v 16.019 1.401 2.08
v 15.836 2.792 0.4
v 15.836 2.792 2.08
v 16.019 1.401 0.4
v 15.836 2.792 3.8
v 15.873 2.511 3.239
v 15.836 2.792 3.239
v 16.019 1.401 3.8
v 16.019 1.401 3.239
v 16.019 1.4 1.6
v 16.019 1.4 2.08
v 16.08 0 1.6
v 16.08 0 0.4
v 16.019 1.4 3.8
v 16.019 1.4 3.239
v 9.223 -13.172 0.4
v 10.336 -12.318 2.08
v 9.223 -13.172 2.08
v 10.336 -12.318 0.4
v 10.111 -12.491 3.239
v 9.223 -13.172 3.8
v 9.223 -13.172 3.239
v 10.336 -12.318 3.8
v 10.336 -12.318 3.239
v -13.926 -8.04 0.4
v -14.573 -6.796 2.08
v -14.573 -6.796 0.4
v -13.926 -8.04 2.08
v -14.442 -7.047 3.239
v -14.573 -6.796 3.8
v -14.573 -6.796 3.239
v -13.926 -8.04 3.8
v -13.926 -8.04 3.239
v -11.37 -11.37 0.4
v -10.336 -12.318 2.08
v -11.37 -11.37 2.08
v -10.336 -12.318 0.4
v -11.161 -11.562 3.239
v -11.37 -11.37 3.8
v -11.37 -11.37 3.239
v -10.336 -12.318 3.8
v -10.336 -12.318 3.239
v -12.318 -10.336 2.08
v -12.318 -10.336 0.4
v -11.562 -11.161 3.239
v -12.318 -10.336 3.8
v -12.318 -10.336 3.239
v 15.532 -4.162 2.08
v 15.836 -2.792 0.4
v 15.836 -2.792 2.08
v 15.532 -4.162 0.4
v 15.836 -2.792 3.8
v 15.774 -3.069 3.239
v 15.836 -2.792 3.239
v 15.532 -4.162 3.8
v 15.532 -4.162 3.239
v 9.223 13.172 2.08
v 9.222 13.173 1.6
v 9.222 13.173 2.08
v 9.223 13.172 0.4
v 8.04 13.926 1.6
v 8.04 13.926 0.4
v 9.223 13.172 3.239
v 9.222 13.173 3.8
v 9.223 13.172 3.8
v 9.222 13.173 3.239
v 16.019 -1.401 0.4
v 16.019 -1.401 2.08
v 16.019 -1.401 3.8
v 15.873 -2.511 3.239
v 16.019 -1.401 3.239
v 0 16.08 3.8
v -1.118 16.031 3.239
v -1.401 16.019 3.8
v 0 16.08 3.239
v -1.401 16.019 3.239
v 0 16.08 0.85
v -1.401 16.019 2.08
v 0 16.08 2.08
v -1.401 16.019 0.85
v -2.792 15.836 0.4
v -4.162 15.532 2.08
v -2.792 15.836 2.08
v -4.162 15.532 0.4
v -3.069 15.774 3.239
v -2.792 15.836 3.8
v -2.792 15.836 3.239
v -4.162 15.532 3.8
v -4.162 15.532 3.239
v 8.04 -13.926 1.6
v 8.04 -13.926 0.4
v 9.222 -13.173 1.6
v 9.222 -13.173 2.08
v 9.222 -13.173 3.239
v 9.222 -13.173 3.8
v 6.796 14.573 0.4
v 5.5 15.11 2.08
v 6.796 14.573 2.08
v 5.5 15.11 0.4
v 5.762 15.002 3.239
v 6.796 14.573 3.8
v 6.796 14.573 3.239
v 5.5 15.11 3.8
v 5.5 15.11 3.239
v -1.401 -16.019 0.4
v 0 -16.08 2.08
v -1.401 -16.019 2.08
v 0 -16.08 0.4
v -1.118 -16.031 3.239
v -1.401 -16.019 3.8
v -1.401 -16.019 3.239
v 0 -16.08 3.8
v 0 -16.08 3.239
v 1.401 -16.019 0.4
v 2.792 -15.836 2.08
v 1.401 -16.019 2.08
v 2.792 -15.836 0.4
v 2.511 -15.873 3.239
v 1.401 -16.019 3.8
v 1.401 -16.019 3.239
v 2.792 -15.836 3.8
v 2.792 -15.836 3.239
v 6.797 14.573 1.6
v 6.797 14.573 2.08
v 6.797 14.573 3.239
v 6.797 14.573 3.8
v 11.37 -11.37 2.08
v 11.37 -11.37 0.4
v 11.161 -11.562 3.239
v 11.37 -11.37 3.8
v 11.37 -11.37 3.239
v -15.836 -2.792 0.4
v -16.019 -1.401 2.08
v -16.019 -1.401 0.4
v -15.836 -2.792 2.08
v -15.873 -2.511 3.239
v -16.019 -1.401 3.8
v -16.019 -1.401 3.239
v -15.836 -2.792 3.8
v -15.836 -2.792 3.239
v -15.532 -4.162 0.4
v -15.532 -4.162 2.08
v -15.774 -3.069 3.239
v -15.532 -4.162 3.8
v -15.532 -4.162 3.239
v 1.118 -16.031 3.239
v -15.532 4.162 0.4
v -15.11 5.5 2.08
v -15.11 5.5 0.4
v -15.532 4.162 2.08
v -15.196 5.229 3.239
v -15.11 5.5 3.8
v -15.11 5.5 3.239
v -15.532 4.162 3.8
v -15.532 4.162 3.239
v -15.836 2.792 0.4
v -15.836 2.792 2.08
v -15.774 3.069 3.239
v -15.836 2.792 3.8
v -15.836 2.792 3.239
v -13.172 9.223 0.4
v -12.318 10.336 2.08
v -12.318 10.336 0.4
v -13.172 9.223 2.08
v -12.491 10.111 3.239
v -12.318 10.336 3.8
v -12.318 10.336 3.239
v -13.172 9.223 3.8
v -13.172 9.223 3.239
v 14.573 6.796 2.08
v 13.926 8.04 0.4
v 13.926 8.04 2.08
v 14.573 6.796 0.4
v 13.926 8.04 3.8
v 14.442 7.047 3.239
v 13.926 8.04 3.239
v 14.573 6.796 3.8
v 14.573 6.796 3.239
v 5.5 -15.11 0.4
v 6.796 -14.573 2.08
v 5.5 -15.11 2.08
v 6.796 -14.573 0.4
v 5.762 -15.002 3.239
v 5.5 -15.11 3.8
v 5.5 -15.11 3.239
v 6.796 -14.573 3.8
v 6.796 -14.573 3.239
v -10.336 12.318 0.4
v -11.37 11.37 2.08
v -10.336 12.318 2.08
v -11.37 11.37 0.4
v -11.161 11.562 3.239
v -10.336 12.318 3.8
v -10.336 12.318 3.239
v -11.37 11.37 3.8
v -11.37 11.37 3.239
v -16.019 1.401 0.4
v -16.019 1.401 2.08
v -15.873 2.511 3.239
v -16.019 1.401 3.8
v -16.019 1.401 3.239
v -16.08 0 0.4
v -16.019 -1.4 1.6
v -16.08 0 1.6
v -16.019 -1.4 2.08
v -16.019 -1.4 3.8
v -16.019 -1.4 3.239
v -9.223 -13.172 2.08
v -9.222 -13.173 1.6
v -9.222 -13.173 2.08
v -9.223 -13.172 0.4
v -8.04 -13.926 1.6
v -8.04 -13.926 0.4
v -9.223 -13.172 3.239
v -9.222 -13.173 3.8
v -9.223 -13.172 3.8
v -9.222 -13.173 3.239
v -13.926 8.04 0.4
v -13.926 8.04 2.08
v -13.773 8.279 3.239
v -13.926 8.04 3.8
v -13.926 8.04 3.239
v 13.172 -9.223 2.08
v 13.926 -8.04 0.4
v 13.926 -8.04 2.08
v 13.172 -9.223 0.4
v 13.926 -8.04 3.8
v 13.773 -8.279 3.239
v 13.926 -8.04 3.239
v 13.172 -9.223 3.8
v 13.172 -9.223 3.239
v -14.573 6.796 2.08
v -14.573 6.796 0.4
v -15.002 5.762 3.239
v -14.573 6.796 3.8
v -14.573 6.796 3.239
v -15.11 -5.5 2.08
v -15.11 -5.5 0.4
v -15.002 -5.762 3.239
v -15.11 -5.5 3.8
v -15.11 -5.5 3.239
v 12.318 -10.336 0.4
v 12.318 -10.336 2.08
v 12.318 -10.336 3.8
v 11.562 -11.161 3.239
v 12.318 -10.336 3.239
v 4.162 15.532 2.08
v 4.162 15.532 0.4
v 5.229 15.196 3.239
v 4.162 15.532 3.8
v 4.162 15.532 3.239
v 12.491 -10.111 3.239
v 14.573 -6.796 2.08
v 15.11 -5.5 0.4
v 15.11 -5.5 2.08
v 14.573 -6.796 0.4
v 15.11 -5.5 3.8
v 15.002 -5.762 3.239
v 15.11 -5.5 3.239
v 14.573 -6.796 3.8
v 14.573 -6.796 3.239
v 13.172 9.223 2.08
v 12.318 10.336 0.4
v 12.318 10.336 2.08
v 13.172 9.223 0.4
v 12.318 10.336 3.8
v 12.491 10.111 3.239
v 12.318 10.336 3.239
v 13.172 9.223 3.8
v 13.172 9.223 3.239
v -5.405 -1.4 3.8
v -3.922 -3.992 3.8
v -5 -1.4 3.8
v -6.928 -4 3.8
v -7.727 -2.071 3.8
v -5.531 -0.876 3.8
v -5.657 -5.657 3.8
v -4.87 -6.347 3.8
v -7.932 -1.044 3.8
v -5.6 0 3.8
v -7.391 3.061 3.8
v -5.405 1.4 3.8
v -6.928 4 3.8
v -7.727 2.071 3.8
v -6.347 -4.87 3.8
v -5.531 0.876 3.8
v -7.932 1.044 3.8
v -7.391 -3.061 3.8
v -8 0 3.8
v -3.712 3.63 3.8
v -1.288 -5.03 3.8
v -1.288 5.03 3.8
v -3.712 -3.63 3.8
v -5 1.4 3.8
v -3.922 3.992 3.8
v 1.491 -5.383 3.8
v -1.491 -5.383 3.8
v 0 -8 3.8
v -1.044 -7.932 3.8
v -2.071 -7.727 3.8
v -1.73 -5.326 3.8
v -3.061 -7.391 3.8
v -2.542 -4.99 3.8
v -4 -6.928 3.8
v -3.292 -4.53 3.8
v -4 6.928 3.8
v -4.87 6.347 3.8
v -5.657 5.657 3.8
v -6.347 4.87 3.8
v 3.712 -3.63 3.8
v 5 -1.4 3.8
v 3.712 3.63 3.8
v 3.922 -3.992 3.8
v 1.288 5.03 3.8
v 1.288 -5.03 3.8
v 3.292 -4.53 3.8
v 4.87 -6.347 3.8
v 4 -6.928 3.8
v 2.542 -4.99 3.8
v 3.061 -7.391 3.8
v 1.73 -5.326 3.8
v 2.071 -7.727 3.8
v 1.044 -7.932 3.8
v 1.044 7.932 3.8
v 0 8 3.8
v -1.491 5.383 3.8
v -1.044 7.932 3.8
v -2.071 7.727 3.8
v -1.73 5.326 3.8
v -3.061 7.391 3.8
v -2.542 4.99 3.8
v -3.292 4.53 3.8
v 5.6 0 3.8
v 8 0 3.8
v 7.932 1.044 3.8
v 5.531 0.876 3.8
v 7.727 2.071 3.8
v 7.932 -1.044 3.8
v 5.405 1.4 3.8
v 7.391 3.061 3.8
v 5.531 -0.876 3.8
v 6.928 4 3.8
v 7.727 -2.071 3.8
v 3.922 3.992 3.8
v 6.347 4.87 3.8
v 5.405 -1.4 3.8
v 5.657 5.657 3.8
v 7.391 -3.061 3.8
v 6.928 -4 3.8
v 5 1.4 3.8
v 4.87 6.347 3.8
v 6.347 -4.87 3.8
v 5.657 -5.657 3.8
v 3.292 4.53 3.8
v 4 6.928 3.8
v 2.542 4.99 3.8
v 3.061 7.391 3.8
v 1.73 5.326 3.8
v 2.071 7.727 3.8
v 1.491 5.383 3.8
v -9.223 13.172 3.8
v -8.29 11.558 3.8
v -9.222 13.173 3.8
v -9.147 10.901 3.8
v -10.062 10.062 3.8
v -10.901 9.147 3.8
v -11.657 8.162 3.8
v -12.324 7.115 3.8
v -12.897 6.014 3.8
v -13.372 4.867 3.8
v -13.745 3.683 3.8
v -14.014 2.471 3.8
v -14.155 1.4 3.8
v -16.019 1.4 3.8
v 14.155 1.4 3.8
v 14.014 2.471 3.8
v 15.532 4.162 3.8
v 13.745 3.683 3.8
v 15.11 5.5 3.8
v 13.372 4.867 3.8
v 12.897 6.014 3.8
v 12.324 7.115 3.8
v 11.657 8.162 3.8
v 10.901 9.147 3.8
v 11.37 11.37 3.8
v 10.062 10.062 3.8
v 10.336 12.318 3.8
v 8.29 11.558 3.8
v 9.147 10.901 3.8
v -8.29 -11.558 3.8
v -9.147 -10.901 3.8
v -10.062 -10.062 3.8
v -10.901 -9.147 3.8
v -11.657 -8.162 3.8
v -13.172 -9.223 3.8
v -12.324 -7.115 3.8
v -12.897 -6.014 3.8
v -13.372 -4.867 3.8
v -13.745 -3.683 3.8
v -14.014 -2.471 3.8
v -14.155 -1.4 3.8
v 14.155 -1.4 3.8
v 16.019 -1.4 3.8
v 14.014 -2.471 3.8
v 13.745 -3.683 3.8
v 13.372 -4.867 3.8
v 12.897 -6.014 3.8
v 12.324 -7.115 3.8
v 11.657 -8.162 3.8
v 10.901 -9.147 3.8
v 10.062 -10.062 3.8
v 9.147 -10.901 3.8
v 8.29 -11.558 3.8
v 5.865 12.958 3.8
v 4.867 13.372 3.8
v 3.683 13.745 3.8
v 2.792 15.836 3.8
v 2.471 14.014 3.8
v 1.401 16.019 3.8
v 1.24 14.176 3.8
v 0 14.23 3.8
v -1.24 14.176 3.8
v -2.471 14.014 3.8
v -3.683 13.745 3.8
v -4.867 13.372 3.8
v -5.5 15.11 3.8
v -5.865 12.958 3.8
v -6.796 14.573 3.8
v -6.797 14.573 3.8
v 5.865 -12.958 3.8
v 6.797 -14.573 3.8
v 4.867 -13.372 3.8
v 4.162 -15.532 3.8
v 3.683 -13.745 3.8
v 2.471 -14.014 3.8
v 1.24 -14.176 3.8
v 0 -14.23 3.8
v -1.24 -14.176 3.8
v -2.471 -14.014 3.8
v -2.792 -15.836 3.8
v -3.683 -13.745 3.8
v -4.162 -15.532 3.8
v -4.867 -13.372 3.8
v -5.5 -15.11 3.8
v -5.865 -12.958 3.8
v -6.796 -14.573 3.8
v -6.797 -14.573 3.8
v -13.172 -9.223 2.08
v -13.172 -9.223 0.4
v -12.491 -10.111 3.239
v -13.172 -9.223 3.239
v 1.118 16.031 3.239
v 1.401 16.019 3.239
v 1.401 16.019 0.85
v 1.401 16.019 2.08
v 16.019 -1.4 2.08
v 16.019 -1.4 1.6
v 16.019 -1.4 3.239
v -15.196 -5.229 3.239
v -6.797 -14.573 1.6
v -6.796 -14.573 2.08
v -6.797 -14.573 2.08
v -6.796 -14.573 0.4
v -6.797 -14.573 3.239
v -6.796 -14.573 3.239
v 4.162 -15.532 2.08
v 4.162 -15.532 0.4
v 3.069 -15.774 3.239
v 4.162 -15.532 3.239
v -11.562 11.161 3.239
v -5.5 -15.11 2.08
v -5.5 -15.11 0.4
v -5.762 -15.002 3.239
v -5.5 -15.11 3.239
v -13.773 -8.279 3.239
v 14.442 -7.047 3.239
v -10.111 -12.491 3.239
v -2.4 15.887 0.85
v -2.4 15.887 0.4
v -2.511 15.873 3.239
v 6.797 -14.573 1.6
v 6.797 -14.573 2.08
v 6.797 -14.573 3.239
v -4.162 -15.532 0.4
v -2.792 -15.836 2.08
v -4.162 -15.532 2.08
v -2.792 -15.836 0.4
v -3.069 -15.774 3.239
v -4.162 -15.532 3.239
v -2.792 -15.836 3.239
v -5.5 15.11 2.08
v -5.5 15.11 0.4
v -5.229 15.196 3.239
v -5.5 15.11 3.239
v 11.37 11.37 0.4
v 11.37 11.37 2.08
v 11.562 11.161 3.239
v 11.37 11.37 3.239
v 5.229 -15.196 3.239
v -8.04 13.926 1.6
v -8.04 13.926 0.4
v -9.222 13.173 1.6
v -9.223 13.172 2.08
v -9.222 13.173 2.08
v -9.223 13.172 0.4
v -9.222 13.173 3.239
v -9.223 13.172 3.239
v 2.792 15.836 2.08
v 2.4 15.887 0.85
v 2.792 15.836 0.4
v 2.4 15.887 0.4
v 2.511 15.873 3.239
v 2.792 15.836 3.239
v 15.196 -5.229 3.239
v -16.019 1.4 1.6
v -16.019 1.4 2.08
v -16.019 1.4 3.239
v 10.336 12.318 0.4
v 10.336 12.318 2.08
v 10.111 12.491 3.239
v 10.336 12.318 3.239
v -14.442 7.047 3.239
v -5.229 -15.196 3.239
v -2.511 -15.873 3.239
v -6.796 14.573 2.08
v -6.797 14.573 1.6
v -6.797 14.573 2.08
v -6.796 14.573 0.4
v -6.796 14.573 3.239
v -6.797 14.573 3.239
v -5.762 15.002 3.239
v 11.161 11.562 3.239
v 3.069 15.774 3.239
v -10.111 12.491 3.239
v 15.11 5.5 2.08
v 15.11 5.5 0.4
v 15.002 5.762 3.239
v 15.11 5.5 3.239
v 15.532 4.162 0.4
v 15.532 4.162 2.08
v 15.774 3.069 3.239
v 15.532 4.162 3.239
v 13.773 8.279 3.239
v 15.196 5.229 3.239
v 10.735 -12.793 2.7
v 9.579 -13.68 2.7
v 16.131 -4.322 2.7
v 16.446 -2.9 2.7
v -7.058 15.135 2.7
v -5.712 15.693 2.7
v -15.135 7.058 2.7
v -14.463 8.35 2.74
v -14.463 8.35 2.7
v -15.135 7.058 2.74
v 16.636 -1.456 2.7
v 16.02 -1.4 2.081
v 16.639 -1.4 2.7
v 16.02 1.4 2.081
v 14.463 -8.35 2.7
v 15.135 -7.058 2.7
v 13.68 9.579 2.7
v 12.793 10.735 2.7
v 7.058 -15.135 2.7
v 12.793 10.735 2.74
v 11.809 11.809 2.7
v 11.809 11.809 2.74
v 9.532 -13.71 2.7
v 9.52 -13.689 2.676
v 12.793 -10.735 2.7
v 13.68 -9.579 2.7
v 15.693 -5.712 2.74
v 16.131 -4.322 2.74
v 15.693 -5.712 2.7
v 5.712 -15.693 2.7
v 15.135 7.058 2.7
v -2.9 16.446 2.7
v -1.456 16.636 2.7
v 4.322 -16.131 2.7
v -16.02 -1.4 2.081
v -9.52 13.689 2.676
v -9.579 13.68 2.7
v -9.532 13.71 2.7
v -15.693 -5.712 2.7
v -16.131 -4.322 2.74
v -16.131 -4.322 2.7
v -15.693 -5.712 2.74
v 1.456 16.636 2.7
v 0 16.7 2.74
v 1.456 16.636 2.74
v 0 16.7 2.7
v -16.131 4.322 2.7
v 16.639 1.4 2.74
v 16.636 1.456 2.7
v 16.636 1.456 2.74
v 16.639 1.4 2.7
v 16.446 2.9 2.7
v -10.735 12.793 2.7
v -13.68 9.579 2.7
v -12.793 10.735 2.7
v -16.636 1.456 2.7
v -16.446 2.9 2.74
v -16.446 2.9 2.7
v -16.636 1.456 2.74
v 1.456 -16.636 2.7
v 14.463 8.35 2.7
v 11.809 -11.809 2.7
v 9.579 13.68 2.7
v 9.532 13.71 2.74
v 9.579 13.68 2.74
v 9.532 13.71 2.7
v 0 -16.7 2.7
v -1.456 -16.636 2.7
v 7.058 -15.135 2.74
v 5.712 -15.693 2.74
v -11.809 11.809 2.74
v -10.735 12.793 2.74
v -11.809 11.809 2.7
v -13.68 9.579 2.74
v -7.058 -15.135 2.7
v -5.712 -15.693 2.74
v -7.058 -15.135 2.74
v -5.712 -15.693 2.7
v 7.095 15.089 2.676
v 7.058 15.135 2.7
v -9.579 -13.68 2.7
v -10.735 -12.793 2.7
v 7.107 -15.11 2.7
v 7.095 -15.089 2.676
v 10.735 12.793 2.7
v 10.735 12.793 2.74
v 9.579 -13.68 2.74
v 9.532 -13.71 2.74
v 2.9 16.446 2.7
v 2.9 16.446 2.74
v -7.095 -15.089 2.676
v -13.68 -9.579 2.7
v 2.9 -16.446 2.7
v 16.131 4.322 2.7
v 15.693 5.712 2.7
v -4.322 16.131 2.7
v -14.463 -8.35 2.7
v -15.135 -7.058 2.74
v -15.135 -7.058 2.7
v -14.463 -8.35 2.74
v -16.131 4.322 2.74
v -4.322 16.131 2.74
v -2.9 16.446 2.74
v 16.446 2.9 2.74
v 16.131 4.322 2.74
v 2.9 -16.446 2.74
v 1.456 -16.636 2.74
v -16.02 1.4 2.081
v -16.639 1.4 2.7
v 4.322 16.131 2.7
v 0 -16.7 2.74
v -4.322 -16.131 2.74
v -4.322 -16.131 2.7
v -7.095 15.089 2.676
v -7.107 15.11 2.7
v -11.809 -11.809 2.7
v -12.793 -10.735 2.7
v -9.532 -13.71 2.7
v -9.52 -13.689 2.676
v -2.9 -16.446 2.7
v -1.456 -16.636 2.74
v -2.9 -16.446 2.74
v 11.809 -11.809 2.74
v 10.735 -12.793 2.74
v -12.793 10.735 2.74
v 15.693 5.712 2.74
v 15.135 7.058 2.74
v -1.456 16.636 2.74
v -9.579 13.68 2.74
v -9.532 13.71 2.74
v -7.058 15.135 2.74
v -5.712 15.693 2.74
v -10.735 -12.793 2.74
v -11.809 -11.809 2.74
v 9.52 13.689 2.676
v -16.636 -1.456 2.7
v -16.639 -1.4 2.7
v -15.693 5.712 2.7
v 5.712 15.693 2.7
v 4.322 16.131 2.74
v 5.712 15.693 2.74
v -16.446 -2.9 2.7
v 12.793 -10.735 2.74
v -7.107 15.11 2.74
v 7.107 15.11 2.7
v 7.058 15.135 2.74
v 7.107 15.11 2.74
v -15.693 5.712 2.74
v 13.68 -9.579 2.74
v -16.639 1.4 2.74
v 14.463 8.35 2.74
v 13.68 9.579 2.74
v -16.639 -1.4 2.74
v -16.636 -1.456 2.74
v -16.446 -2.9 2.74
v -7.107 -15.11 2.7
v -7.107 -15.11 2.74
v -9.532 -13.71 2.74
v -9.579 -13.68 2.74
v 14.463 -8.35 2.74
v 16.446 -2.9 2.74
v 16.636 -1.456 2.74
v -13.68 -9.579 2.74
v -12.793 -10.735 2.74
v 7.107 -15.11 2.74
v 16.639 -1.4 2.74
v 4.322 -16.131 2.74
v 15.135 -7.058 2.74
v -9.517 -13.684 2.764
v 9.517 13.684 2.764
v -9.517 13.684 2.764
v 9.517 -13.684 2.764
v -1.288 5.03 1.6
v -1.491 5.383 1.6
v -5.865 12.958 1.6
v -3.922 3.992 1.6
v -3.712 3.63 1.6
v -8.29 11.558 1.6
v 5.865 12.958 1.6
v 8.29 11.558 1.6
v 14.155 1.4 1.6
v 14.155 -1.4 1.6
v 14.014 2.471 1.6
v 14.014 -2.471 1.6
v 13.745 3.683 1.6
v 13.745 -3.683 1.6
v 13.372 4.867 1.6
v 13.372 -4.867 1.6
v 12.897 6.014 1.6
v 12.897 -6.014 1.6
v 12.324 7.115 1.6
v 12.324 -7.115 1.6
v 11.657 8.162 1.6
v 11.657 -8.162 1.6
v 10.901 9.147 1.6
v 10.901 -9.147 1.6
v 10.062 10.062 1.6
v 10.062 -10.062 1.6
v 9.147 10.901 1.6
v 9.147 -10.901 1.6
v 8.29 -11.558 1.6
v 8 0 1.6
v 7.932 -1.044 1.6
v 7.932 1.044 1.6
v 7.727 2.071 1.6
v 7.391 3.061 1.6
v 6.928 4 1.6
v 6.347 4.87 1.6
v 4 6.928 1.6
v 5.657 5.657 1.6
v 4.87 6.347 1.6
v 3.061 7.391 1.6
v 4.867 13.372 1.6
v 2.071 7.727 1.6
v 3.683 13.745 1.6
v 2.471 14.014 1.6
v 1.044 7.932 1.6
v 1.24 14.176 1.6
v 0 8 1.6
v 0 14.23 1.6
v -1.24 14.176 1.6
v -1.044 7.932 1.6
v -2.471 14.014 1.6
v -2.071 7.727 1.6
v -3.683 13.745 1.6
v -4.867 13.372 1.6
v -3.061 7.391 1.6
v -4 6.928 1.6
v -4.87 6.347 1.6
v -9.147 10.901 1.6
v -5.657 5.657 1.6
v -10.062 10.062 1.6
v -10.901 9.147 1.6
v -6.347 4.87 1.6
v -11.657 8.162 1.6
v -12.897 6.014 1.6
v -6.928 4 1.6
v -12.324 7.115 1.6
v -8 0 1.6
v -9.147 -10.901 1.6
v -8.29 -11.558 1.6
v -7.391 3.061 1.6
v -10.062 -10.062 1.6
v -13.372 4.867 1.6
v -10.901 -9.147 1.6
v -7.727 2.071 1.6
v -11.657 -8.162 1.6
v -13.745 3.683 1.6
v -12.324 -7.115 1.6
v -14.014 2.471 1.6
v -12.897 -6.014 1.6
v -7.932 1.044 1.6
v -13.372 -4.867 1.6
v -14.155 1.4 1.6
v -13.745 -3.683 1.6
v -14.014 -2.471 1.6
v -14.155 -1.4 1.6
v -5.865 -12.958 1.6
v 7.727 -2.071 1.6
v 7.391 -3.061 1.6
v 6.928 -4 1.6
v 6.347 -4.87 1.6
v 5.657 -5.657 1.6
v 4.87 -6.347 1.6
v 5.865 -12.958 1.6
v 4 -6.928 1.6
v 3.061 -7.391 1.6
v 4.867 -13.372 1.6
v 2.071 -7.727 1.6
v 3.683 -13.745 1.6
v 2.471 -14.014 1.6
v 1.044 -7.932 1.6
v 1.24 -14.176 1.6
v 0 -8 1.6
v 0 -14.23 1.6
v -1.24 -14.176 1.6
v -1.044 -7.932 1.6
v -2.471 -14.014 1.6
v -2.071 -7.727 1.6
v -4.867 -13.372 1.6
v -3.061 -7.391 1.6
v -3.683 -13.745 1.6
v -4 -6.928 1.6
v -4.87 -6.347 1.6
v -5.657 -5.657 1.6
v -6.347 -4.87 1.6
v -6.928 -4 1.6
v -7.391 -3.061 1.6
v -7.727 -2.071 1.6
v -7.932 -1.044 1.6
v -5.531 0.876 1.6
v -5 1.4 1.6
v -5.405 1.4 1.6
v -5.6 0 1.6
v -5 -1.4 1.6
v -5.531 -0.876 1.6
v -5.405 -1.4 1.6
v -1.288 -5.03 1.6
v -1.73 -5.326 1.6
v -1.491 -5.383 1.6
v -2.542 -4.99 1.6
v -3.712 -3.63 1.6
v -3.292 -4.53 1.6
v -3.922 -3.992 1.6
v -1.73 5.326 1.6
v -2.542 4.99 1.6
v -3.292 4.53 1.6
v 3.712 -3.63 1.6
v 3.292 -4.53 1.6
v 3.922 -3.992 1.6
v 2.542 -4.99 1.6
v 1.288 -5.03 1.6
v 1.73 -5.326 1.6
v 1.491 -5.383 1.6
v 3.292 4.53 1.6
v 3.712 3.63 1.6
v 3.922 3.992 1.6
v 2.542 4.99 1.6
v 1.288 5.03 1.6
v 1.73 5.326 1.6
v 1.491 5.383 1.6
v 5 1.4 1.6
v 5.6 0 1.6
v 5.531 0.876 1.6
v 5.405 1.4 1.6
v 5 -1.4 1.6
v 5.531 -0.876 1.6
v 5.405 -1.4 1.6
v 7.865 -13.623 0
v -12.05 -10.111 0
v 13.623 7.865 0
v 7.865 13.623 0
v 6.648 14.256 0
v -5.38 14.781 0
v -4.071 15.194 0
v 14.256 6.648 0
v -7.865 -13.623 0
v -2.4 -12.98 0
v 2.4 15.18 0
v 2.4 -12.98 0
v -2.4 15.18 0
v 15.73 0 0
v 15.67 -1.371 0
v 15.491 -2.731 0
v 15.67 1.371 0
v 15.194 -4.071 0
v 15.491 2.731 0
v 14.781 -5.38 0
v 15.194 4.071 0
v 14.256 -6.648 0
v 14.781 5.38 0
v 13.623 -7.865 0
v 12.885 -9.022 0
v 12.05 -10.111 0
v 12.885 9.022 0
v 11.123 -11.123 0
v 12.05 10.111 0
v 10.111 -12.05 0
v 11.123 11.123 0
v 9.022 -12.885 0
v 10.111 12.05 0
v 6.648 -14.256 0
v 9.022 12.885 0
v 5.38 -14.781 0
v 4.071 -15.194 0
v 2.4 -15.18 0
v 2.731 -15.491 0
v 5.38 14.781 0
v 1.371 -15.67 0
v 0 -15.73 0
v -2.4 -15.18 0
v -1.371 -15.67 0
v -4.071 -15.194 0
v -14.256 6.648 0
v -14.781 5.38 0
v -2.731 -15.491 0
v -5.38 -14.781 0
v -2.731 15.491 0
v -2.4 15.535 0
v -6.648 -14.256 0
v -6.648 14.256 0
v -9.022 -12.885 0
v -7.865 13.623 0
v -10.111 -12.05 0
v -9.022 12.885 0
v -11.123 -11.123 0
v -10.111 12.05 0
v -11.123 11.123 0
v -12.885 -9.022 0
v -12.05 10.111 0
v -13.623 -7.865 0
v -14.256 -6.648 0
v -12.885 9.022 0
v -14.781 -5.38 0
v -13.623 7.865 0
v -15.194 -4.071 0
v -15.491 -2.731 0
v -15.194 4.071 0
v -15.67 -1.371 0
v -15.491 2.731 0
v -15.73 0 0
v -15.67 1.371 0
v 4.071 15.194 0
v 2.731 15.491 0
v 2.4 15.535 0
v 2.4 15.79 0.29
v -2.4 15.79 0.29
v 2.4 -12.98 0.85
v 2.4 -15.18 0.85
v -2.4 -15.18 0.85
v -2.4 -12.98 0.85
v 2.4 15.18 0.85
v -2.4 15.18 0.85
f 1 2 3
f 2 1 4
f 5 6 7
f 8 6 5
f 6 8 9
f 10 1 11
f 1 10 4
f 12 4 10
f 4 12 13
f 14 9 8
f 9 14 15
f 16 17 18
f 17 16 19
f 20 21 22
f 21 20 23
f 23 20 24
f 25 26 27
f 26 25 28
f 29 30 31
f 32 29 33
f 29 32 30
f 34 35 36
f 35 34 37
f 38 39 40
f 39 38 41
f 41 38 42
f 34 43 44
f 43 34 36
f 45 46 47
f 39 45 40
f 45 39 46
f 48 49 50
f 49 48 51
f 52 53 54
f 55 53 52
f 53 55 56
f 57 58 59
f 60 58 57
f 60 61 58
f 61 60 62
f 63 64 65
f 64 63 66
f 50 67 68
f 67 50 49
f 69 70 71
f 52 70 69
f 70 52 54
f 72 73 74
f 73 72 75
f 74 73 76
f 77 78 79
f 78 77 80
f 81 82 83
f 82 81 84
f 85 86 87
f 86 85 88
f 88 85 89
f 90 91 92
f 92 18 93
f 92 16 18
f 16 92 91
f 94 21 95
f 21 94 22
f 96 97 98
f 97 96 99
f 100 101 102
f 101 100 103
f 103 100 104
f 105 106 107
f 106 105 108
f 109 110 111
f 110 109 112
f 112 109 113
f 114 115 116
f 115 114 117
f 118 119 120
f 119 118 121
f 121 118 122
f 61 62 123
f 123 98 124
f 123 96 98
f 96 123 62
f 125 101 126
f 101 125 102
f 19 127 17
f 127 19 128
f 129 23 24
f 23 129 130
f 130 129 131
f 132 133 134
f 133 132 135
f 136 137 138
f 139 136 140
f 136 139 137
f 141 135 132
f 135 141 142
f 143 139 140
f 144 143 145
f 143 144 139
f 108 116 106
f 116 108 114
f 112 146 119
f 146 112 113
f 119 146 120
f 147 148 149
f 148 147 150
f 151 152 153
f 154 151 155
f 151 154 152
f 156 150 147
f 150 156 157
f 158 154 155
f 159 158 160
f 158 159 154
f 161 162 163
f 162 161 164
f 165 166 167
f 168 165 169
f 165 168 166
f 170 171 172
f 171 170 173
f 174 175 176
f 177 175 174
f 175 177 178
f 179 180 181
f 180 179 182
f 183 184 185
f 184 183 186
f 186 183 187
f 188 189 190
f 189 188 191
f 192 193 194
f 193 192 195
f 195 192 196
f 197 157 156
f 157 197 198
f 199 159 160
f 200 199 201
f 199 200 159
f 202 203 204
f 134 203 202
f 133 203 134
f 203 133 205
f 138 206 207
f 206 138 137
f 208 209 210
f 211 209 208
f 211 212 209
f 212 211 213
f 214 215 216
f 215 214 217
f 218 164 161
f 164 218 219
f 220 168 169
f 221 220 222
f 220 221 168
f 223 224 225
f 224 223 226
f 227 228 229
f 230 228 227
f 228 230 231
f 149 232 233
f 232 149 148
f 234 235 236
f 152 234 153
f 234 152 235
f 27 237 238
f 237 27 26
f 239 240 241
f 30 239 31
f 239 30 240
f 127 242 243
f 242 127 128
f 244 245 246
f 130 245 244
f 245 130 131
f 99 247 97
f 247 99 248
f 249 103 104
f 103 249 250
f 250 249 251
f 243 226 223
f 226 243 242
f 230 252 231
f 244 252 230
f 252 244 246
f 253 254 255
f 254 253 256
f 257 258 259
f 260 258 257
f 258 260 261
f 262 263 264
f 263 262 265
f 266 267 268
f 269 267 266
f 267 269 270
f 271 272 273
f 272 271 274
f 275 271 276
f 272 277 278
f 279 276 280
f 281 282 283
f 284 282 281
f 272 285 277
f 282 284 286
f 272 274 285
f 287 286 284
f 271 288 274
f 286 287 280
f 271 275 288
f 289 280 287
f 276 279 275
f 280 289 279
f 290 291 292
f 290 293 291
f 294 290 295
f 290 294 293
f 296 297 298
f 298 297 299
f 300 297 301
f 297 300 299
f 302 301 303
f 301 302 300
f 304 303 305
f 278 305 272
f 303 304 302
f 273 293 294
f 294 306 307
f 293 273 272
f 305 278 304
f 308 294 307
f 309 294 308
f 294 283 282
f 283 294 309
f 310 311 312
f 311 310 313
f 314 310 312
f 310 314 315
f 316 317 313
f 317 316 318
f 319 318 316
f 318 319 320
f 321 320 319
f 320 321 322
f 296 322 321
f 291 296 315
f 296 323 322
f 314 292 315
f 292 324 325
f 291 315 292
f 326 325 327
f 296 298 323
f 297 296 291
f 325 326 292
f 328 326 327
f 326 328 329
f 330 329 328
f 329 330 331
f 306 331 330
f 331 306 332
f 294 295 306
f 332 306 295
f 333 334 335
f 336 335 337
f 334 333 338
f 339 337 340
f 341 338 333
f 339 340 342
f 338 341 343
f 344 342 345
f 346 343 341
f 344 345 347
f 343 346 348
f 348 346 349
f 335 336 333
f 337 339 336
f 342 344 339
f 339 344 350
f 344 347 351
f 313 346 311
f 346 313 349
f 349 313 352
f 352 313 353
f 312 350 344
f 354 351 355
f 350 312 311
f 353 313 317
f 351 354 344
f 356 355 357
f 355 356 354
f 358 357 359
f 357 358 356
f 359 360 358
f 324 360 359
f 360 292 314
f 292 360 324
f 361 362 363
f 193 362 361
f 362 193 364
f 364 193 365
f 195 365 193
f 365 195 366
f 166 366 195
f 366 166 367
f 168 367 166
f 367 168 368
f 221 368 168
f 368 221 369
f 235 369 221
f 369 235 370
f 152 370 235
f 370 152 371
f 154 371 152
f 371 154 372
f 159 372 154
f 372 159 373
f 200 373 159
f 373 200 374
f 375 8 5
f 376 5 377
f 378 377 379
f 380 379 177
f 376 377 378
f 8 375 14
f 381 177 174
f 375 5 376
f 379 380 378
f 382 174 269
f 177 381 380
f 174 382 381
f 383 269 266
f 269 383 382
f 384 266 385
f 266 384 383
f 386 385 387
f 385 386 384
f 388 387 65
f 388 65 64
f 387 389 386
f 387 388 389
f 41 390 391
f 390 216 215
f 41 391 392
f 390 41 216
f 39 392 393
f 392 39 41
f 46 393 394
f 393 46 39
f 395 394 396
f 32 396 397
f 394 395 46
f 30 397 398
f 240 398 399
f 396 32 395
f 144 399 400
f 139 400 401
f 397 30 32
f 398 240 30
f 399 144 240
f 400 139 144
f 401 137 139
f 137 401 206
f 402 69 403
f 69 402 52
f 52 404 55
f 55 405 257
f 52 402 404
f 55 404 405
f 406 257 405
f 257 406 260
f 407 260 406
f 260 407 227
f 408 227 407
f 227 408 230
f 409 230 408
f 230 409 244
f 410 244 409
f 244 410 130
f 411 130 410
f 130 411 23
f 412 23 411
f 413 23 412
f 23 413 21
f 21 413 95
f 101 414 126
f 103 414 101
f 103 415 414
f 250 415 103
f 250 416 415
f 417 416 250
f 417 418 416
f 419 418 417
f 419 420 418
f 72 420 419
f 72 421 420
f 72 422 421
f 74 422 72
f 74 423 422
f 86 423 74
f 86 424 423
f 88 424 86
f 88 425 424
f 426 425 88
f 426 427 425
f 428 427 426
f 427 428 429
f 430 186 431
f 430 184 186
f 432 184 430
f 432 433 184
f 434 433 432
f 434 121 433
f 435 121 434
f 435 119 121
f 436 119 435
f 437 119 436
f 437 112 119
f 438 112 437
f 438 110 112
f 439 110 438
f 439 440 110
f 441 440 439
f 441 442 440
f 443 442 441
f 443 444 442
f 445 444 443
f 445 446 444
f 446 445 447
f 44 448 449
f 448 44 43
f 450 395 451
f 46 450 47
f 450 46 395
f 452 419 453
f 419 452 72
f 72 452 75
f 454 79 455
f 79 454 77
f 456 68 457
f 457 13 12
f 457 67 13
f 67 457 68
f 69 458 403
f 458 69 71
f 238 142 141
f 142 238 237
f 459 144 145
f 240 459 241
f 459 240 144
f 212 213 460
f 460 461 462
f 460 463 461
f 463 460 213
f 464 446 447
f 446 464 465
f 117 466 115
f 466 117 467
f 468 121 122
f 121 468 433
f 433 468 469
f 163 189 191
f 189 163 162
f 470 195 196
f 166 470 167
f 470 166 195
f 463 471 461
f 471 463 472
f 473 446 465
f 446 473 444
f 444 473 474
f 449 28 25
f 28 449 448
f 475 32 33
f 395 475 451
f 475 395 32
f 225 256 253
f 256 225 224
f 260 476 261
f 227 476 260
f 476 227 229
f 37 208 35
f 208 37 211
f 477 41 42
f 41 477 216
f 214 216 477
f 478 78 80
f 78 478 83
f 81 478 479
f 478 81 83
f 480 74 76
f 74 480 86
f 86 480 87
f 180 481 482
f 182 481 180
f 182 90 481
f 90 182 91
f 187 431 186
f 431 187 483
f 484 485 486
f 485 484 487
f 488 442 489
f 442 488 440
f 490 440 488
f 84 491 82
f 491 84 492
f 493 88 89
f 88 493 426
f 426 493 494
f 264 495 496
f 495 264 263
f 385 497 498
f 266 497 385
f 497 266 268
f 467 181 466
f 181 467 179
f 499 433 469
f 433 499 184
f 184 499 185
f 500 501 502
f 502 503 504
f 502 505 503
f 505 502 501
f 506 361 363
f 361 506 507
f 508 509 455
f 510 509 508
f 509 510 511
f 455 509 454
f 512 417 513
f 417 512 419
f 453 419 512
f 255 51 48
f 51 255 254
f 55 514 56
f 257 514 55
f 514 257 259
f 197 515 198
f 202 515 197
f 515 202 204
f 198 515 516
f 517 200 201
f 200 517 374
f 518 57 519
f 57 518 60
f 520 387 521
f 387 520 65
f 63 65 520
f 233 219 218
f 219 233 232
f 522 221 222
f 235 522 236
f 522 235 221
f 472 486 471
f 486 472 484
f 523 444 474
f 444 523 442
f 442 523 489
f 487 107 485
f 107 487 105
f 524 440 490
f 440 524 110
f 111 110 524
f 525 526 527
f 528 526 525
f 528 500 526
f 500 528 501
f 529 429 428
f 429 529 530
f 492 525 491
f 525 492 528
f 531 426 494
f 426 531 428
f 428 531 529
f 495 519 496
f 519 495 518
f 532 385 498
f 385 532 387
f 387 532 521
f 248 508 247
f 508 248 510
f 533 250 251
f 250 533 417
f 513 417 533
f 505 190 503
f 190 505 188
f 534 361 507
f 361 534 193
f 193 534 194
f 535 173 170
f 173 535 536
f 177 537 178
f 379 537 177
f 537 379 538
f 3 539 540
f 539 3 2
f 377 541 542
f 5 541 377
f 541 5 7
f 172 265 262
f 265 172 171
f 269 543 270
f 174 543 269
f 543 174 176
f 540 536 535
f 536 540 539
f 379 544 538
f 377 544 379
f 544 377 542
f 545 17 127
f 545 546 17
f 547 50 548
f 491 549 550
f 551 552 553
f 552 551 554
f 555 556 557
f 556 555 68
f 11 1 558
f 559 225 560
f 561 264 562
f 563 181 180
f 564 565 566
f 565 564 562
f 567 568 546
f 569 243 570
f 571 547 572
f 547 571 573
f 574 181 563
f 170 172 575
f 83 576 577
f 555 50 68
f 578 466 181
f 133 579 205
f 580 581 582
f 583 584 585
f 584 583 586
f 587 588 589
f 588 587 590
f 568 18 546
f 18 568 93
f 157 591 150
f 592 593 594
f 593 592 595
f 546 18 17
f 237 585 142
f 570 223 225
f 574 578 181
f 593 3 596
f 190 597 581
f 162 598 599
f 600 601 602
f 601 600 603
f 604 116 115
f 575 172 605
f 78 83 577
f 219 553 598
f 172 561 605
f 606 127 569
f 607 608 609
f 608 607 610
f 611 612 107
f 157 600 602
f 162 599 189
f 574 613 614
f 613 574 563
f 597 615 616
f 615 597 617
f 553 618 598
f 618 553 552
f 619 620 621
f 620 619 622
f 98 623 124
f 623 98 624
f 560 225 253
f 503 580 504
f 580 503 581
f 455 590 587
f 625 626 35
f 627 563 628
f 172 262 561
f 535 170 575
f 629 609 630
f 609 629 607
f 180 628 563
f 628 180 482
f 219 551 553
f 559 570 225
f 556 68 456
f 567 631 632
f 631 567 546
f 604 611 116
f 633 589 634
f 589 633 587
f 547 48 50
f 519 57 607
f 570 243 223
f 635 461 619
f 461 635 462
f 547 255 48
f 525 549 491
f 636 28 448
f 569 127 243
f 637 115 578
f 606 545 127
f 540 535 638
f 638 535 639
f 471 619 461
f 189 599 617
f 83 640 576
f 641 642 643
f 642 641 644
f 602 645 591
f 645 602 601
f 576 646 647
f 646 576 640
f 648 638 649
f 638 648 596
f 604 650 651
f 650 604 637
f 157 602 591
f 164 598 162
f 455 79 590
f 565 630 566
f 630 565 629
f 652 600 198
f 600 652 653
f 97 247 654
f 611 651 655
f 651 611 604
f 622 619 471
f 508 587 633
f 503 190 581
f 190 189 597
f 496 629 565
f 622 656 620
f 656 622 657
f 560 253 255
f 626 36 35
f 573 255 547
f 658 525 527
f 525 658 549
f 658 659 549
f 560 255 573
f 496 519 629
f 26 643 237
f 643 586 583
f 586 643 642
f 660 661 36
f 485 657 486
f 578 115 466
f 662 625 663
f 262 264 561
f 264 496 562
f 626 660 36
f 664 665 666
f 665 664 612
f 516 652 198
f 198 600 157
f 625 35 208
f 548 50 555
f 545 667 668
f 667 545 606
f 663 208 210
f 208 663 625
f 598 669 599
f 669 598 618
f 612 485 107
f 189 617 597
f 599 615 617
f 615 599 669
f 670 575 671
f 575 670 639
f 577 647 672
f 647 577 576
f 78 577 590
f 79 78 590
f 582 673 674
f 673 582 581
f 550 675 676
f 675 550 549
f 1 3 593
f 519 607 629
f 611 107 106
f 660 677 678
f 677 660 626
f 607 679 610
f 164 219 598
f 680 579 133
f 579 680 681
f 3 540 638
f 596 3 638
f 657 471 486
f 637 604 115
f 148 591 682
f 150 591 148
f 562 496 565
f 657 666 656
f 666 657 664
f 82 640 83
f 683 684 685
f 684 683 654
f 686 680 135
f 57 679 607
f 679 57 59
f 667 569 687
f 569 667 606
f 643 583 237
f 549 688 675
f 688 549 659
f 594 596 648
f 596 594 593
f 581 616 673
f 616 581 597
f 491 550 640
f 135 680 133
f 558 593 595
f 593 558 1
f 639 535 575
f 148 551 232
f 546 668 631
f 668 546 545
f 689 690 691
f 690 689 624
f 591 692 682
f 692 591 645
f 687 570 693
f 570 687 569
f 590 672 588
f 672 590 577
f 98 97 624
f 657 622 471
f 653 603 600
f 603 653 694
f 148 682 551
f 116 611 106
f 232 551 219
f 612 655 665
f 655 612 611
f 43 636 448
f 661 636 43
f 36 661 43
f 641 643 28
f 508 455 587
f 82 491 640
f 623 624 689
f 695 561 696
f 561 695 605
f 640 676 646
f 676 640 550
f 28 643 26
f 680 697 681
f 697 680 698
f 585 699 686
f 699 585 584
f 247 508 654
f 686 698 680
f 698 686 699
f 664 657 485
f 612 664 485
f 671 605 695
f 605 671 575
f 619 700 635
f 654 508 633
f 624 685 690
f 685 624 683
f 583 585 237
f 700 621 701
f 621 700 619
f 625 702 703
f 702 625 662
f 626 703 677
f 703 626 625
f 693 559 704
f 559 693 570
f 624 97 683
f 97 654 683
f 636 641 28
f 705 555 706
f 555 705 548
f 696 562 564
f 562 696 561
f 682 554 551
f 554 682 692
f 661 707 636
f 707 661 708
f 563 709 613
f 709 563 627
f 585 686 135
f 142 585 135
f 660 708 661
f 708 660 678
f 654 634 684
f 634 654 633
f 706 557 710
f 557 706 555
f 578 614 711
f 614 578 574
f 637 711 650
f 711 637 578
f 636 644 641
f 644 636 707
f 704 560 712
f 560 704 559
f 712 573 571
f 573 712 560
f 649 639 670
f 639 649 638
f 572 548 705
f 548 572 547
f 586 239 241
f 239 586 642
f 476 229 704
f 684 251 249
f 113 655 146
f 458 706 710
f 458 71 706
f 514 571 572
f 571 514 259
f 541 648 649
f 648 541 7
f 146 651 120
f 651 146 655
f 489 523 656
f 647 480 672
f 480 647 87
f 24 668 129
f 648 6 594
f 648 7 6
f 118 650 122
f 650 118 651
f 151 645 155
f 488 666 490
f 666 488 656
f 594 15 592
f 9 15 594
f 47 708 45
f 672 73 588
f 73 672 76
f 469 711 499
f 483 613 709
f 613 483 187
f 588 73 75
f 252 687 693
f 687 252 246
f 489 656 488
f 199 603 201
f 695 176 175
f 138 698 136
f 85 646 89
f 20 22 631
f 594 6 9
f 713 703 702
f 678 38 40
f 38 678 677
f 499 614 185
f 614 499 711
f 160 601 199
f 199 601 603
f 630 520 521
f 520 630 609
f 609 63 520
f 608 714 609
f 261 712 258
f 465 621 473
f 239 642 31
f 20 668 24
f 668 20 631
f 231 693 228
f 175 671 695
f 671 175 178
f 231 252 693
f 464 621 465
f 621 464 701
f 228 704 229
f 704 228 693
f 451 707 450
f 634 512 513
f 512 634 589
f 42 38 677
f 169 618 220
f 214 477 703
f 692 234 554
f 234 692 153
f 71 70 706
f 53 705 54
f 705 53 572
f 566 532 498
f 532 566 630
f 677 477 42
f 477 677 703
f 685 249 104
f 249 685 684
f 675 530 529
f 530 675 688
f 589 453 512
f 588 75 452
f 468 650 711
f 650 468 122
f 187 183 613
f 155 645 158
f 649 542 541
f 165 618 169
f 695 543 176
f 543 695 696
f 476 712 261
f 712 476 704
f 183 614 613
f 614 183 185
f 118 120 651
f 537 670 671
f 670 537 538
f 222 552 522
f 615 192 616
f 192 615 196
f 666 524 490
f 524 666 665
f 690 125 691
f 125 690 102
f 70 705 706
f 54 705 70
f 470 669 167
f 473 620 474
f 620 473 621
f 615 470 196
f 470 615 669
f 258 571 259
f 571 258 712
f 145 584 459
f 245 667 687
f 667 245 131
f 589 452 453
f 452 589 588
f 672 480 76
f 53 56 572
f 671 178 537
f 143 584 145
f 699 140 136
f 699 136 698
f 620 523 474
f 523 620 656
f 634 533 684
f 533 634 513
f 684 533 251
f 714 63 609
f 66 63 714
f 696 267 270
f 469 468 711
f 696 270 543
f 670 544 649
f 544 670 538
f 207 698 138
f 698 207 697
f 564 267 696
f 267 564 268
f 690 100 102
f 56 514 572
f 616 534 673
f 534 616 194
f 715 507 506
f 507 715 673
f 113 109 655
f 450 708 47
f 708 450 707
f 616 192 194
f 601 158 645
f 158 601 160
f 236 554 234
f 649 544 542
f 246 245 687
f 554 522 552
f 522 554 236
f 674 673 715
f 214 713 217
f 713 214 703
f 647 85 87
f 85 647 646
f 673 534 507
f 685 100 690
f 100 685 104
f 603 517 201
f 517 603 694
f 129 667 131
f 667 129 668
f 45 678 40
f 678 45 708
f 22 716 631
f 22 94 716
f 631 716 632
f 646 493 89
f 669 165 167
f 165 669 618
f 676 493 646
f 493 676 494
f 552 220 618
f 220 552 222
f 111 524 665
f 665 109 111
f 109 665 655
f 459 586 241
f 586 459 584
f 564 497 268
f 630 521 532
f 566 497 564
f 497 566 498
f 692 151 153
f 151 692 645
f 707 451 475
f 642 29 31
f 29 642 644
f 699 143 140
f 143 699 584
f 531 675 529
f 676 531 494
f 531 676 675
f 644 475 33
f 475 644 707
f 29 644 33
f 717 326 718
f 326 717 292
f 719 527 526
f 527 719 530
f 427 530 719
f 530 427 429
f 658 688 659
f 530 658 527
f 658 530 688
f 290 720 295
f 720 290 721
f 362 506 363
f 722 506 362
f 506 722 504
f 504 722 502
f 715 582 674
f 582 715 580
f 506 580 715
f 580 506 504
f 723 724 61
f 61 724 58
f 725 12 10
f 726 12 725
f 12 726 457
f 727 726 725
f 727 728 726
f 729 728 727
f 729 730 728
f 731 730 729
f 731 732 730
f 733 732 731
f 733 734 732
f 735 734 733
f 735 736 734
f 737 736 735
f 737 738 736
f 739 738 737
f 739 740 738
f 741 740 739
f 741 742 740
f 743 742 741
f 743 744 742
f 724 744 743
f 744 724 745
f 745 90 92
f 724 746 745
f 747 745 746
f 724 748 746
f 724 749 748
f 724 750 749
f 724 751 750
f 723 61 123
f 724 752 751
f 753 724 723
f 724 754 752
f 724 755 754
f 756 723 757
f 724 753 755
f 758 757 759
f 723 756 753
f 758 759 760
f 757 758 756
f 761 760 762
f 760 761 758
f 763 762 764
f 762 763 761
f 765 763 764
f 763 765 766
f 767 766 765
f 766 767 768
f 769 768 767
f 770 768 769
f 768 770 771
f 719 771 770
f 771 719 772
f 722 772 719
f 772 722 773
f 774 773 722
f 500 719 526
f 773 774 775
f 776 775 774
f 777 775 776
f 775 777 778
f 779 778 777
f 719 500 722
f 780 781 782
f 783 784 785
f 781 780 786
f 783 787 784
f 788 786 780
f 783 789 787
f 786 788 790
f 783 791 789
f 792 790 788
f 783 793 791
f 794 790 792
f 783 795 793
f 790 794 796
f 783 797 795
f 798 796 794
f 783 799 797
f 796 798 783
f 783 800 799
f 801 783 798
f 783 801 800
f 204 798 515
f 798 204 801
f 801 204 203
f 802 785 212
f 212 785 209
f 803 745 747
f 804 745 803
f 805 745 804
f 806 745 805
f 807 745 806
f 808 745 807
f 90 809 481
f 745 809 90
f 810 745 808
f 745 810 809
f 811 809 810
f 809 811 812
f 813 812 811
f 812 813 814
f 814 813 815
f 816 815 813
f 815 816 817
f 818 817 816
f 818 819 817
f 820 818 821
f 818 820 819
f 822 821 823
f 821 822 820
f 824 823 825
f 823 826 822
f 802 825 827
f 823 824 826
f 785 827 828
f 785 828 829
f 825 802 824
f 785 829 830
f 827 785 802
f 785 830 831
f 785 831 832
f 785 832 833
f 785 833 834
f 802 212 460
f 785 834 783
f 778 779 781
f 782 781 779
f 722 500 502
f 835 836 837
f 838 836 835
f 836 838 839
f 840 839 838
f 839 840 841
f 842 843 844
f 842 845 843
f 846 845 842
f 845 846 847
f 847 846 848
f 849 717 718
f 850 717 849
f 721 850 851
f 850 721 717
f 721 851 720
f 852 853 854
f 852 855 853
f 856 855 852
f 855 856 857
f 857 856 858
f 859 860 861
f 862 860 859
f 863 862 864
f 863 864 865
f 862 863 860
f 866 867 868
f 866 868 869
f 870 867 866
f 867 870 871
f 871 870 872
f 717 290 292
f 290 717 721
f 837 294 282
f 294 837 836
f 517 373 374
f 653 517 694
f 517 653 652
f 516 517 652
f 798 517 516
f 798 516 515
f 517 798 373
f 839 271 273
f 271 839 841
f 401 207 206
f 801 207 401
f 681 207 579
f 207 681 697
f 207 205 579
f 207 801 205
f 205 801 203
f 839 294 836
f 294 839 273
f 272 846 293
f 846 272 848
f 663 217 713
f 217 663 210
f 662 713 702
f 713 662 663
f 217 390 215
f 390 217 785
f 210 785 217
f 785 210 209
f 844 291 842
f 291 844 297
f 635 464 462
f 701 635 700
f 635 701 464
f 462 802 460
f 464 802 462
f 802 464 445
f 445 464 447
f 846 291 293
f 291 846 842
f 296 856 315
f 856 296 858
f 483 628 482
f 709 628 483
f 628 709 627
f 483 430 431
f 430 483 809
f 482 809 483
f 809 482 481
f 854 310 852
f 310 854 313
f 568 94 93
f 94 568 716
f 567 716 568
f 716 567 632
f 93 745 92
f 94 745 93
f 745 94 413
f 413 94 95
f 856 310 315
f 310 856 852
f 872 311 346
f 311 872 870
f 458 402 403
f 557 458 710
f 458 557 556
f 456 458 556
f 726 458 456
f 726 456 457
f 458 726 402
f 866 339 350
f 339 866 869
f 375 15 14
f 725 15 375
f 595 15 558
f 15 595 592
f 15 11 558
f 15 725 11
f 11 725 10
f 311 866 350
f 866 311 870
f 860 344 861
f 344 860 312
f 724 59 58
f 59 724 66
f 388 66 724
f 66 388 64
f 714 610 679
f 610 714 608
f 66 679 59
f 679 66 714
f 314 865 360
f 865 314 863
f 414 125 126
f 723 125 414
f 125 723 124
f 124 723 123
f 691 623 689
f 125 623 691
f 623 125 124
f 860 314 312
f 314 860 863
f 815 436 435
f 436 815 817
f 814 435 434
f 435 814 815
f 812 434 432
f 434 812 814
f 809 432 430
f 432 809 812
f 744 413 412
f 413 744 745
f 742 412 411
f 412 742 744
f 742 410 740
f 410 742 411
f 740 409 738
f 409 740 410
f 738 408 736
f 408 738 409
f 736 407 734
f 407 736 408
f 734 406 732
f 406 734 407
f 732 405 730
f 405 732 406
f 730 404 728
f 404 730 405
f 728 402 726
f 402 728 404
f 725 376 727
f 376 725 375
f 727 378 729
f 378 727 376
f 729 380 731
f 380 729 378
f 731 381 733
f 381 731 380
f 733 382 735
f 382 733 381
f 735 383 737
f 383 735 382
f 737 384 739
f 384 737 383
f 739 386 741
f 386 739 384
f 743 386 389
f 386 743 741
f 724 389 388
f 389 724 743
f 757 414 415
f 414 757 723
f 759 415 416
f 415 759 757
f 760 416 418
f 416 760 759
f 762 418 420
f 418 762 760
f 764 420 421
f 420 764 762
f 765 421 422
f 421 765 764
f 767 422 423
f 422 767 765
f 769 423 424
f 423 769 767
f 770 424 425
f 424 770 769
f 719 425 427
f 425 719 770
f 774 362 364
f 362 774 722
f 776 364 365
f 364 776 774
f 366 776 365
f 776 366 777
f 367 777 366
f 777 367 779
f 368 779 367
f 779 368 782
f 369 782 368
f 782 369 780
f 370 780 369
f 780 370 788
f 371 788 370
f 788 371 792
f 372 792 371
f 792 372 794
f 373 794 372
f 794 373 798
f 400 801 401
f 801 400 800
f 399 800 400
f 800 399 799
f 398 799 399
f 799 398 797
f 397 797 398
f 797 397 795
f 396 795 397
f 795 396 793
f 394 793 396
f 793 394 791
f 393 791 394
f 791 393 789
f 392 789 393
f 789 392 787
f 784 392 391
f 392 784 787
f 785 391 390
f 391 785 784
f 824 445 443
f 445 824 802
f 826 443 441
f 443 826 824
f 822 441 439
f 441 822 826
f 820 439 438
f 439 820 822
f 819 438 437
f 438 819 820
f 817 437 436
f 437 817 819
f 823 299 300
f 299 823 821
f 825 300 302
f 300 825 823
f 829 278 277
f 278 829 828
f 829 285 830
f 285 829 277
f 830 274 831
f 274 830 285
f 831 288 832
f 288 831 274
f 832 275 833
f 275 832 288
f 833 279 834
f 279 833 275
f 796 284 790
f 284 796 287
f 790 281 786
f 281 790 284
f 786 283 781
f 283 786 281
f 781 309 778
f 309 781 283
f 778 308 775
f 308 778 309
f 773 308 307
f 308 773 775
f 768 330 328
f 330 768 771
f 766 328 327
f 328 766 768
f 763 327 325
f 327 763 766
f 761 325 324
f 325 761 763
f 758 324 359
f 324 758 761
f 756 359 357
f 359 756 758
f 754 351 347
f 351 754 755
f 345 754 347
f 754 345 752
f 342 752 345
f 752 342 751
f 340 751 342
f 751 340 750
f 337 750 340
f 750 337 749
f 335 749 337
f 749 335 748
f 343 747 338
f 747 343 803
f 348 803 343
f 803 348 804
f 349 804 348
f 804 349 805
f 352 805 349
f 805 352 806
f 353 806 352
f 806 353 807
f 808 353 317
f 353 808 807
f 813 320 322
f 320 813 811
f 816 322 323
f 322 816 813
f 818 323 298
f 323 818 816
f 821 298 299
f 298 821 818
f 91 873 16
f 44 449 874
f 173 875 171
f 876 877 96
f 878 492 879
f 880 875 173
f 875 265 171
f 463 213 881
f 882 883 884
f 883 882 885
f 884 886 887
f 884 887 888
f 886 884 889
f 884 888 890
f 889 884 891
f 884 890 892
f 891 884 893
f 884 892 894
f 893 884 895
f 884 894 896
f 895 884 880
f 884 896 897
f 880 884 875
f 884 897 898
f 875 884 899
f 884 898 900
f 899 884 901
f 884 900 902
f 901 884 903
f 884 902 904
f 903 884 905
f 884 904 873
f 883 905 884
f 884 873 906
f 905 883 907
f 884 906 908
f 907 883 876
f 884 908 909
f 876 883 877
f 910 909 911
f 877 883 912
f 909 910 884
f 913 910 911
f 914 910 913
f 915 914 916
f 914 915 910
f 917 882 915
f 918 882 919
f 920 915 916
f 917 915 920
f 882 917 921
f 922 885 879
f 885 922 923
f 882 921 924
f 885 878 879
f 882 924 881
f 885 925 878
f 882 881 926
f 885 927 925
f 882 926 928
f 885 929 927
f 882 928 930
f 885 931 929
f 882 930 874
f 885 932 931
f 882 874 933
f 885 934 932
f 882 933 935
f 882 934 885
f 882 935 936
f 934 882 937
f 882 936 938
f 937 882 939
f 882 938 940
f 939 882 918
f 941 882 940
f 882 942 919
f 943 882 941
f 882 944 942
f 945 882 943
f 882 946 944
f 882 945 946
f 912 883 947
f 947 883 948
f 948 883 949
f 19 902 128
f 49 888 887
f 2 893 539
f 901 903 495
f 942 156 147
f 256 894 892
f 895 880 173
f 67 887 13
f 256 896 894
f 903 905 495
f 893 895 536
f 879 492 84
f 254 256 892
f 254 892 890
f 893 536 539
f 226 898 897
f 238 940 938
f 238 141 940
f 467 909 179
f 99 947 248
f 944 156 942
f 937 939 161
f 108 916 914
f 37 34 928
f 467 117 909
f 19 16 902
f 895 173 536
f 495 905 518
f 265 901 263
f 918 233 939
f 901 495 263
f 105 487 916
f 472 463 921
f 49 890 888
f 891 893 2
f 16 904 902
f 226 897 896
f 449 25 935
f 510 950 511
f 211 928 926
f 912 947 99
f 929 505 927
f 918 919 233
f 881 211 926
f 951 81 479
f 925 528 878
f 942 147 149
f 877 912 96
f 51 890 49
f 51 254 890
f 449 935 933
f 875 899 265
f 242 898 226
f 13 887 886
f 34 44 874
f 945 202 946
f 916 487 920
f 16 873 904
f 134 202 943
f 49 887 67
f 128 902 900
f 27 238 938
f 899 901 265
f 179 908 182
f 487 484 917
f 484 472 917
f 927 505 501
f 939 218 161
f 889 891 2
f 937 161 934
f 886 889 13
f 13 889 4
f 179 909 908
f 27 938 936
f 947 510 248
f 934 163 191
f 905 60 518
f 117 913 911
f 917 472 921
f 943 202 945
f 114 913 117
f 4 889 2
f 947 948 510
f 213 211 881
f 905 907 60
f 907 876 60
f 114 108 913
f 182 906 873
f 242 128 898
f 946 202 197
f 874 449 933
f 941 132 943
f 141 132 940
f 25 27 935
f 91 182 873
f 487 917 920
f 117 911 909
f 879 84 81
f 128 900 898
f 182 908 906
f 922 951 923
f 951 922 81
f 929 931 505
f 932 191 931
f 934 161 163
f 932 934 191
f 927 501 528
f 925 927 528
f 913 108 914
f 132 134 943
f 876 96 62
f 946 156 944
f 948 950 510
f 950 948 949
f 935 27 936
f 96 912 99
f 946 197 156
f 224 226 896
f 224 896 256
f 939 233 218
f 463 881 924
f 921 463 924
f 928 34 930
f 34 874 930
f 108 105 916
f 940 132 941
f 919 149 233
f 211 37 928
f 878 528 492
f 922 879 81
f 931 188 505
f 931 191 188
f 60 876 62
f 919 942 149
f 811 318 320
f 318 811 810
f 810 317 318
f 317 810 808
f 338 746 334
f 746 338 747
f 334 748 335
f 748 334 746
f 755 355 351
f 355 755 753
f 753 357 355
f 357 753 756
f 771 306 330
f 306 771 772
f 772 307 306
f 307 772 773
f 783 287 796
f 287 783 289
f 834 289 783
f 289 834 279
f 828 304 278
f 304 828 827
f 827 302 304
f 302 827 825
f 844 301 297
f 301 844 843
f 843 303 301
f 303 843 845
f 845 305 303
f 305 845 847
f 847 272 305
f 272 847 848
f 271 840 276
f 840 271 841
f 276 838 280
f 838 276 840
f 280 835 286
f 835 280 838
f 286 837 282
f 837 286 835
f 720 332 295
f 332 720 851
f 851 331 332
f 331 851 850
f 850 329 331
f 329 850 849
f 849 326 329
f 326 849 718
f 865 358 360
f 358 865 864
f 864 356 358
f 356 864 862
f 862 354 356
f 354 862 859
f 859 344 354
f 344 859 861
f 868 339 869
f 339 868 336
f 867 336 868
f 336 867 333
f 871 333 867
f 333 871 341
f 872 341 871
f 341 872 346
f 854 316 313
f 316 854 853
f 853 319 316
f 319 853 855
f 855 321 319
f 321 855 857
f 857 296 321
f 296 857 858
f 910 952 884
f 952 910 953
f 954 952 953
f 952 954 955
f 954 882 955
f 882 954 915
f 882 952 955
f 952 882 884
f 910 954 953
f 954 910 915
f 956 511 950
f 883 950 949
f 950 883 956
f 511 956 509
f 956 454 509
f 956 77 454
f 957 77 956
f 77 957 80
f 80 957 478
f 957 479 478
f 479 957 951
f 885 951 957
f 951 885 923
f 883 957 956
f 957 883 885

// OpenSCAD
// Internal Snap-Fit Magnet Cover for LOVIMAG 110 lb Round Magnet (32 x 30/32 x 6 mm)
// Prints flat on its smooth outer cap face (Z = 0 .. 3.80 mm) with ZERO supports in ~4 minutes.
//
// Assembly:
//   1. Drop the 32 x 6 mm LOVIMAG magnet into the base's internal magnet slot (open magnetic pole face DOWN against the 0.50 mm outer rear skin).
//   2. Press this snap-fit cover straight down over the magnet until the 6 slotted flex-latch petals click into the internal 45 deg V-groove!
//   3. The cover sits at Y = +2.00 .. +5.80 mm inside the rear chamber (1.50 mm clear behind the white reflector) and clamps the magnet rattle-free.

mag_dia_x      = 32.00;           // Matches `mag_dia_x` in vertical_lamp_core.scad
mag_dia_z      = 32.00;           // Matches `mag_dia_z` in vertical_lamp_core.scad (set 30.00 if oval)
throat_d_x     = mag_dia_x + 0.60; // 32.60 mm base entry throat
cap_clr        = 0.22;            // Per-side radial clearance of cap body inside 32.60 mm throat (-> 32.16 mm OD)
cap_plate_t    = 1.60;            // Solid outer cap disc thickness (mm)
total_h        = 3.80;            // Total height from cap top (Y = +2.00 mm) to magnet face (Y = +5.80 mm)
snap_z         = 2.70;            // Exact Z height of snap bead apex (lands at Y = +2.00 + 2.70 = +4.70 mm groove apex!)
snap_protrude  = 0.62;            // Radial snap bead protrusion past cap rim (33.40 mm OD -> 0.40 mm engagement per side in 34.00 mm groove)
snap_span_z    = 1.24;            // 45 deg upper & lower ramps on snap bead (zero overhang, effortless click-in & pry-out)
petal_wall_t   = 1.85;            // Radial thickness of the 6 curved cantilevered flex-petals (mm)
num_petals     = 6;
slot_gap_w     = 2.80;            // Width of radial flex-relief slots separating the 6 snap petals (mm)

module cap_profile_2d(delta_r = 0) {
    rx = throat_d_x / 2 - cap_clr + delta_r;
    rz = (mag_dia_z + 0.60) / 2 - cap_clr + delta_r;
    scale([rx / 16.0, rz / 16.0]) circle(r = 16.0, $fn = 72);
}

module magnet_snap_cover() {
    difference() {
        union() {
            // 1. Solid outer cap disc (Z = 0 .. 1.60 mm, with slight 0.4 mm bottom edge chamfer)
            hull() {
                linear_extrude(height = 0.05) cap_profile_2d(-0.35);
                translate([0, 0, 0.40]) linear_extrude(height = cap_plate_t - 0.40) cap_profile_2d(0);
            }

            // 2. Slotted flex-latch crown + 45 deg outward snap bead (Z = 1.60 .. 3.80 mm)
            difference() {
                union() {
                    translate([0, 0, cap_plate_t - 0.05])
                        linear_extrude(height = total_h - cap_plate_t + 0.05)
                            cap_profile_2d(0);

                    // 45 deg outward snap V-bead centered at Z = snap_z (2.70 mm)
                    hull() {
                        translate([0, 0, snap_z - snap_span_z / 2])
                            linear_extrude(height = 0.04) cap_profile_2d(0);
                        translate([0, 0, snap_z])
                            linear_extrude(height = 0.04) cap_profile_2d(snap_protrude);
                    }
                    hull() {
                        translate([0, 0, snap_z])
                            linear_extrude(height = 0.04) cap_profile_2d(snap_protrude);
                        translate([0, 0, snap_z + snap_span_z / 2])
                            linear_extrude(height = 0.04) cap_profile_2d(-0.15); // tapered lead-in tip!
                    }
                }

                // Hollow flex-relief moat behind the 6 snap petals so they flex inward smoothly
                translate([0, 0, cap_plate_t])
                    linear_extrude(height = total_h + 1.0)
                        difference() {
                            cap_profile_2d(-petal_wall_t);
                            circle(d = 16.0, $fn = 48);
                        }

                // 6 radial flex slots splitting the skirt into 6 independent leaf-spring petals
                for (i = [0 : num_petals - 1])
                    rotate([0, 0, i * (360 / num_petals) + 30])
                        translate([-slot_gap_w / 2, 5.0, cap_plate_t])
                            cube([slot_gap_w, throat_d_x, total_h + 1.0]);
            }

            // 3. Center anti-rattle magnet snubber ring (Z = 1.60 .. 3.80 mm, presses flat on magnet cup back)
            translate([0, 0, cap_plate_t - 0.05])
                linear_extrude(height = total_h - cap_plate_t + 0.05)
                    difference() {
                        circle(d = 16.0, $fn = 48);
                        circle(d = 11.2, $fn = 40);
                    }
        }

        // Subtle screwdriver / fingernail pry notches at +/-Y on the top rim (align with base pry reliefs)
        for (sy = [-1, 1])
            translate([-2.4, sy * ((mag_dia_z + 0.60) / 2 - cap_clr - 0.9), -0.1])
                cube([4.8, 2.2, 0.95]);
    }
}

magnet_snap_cover();
